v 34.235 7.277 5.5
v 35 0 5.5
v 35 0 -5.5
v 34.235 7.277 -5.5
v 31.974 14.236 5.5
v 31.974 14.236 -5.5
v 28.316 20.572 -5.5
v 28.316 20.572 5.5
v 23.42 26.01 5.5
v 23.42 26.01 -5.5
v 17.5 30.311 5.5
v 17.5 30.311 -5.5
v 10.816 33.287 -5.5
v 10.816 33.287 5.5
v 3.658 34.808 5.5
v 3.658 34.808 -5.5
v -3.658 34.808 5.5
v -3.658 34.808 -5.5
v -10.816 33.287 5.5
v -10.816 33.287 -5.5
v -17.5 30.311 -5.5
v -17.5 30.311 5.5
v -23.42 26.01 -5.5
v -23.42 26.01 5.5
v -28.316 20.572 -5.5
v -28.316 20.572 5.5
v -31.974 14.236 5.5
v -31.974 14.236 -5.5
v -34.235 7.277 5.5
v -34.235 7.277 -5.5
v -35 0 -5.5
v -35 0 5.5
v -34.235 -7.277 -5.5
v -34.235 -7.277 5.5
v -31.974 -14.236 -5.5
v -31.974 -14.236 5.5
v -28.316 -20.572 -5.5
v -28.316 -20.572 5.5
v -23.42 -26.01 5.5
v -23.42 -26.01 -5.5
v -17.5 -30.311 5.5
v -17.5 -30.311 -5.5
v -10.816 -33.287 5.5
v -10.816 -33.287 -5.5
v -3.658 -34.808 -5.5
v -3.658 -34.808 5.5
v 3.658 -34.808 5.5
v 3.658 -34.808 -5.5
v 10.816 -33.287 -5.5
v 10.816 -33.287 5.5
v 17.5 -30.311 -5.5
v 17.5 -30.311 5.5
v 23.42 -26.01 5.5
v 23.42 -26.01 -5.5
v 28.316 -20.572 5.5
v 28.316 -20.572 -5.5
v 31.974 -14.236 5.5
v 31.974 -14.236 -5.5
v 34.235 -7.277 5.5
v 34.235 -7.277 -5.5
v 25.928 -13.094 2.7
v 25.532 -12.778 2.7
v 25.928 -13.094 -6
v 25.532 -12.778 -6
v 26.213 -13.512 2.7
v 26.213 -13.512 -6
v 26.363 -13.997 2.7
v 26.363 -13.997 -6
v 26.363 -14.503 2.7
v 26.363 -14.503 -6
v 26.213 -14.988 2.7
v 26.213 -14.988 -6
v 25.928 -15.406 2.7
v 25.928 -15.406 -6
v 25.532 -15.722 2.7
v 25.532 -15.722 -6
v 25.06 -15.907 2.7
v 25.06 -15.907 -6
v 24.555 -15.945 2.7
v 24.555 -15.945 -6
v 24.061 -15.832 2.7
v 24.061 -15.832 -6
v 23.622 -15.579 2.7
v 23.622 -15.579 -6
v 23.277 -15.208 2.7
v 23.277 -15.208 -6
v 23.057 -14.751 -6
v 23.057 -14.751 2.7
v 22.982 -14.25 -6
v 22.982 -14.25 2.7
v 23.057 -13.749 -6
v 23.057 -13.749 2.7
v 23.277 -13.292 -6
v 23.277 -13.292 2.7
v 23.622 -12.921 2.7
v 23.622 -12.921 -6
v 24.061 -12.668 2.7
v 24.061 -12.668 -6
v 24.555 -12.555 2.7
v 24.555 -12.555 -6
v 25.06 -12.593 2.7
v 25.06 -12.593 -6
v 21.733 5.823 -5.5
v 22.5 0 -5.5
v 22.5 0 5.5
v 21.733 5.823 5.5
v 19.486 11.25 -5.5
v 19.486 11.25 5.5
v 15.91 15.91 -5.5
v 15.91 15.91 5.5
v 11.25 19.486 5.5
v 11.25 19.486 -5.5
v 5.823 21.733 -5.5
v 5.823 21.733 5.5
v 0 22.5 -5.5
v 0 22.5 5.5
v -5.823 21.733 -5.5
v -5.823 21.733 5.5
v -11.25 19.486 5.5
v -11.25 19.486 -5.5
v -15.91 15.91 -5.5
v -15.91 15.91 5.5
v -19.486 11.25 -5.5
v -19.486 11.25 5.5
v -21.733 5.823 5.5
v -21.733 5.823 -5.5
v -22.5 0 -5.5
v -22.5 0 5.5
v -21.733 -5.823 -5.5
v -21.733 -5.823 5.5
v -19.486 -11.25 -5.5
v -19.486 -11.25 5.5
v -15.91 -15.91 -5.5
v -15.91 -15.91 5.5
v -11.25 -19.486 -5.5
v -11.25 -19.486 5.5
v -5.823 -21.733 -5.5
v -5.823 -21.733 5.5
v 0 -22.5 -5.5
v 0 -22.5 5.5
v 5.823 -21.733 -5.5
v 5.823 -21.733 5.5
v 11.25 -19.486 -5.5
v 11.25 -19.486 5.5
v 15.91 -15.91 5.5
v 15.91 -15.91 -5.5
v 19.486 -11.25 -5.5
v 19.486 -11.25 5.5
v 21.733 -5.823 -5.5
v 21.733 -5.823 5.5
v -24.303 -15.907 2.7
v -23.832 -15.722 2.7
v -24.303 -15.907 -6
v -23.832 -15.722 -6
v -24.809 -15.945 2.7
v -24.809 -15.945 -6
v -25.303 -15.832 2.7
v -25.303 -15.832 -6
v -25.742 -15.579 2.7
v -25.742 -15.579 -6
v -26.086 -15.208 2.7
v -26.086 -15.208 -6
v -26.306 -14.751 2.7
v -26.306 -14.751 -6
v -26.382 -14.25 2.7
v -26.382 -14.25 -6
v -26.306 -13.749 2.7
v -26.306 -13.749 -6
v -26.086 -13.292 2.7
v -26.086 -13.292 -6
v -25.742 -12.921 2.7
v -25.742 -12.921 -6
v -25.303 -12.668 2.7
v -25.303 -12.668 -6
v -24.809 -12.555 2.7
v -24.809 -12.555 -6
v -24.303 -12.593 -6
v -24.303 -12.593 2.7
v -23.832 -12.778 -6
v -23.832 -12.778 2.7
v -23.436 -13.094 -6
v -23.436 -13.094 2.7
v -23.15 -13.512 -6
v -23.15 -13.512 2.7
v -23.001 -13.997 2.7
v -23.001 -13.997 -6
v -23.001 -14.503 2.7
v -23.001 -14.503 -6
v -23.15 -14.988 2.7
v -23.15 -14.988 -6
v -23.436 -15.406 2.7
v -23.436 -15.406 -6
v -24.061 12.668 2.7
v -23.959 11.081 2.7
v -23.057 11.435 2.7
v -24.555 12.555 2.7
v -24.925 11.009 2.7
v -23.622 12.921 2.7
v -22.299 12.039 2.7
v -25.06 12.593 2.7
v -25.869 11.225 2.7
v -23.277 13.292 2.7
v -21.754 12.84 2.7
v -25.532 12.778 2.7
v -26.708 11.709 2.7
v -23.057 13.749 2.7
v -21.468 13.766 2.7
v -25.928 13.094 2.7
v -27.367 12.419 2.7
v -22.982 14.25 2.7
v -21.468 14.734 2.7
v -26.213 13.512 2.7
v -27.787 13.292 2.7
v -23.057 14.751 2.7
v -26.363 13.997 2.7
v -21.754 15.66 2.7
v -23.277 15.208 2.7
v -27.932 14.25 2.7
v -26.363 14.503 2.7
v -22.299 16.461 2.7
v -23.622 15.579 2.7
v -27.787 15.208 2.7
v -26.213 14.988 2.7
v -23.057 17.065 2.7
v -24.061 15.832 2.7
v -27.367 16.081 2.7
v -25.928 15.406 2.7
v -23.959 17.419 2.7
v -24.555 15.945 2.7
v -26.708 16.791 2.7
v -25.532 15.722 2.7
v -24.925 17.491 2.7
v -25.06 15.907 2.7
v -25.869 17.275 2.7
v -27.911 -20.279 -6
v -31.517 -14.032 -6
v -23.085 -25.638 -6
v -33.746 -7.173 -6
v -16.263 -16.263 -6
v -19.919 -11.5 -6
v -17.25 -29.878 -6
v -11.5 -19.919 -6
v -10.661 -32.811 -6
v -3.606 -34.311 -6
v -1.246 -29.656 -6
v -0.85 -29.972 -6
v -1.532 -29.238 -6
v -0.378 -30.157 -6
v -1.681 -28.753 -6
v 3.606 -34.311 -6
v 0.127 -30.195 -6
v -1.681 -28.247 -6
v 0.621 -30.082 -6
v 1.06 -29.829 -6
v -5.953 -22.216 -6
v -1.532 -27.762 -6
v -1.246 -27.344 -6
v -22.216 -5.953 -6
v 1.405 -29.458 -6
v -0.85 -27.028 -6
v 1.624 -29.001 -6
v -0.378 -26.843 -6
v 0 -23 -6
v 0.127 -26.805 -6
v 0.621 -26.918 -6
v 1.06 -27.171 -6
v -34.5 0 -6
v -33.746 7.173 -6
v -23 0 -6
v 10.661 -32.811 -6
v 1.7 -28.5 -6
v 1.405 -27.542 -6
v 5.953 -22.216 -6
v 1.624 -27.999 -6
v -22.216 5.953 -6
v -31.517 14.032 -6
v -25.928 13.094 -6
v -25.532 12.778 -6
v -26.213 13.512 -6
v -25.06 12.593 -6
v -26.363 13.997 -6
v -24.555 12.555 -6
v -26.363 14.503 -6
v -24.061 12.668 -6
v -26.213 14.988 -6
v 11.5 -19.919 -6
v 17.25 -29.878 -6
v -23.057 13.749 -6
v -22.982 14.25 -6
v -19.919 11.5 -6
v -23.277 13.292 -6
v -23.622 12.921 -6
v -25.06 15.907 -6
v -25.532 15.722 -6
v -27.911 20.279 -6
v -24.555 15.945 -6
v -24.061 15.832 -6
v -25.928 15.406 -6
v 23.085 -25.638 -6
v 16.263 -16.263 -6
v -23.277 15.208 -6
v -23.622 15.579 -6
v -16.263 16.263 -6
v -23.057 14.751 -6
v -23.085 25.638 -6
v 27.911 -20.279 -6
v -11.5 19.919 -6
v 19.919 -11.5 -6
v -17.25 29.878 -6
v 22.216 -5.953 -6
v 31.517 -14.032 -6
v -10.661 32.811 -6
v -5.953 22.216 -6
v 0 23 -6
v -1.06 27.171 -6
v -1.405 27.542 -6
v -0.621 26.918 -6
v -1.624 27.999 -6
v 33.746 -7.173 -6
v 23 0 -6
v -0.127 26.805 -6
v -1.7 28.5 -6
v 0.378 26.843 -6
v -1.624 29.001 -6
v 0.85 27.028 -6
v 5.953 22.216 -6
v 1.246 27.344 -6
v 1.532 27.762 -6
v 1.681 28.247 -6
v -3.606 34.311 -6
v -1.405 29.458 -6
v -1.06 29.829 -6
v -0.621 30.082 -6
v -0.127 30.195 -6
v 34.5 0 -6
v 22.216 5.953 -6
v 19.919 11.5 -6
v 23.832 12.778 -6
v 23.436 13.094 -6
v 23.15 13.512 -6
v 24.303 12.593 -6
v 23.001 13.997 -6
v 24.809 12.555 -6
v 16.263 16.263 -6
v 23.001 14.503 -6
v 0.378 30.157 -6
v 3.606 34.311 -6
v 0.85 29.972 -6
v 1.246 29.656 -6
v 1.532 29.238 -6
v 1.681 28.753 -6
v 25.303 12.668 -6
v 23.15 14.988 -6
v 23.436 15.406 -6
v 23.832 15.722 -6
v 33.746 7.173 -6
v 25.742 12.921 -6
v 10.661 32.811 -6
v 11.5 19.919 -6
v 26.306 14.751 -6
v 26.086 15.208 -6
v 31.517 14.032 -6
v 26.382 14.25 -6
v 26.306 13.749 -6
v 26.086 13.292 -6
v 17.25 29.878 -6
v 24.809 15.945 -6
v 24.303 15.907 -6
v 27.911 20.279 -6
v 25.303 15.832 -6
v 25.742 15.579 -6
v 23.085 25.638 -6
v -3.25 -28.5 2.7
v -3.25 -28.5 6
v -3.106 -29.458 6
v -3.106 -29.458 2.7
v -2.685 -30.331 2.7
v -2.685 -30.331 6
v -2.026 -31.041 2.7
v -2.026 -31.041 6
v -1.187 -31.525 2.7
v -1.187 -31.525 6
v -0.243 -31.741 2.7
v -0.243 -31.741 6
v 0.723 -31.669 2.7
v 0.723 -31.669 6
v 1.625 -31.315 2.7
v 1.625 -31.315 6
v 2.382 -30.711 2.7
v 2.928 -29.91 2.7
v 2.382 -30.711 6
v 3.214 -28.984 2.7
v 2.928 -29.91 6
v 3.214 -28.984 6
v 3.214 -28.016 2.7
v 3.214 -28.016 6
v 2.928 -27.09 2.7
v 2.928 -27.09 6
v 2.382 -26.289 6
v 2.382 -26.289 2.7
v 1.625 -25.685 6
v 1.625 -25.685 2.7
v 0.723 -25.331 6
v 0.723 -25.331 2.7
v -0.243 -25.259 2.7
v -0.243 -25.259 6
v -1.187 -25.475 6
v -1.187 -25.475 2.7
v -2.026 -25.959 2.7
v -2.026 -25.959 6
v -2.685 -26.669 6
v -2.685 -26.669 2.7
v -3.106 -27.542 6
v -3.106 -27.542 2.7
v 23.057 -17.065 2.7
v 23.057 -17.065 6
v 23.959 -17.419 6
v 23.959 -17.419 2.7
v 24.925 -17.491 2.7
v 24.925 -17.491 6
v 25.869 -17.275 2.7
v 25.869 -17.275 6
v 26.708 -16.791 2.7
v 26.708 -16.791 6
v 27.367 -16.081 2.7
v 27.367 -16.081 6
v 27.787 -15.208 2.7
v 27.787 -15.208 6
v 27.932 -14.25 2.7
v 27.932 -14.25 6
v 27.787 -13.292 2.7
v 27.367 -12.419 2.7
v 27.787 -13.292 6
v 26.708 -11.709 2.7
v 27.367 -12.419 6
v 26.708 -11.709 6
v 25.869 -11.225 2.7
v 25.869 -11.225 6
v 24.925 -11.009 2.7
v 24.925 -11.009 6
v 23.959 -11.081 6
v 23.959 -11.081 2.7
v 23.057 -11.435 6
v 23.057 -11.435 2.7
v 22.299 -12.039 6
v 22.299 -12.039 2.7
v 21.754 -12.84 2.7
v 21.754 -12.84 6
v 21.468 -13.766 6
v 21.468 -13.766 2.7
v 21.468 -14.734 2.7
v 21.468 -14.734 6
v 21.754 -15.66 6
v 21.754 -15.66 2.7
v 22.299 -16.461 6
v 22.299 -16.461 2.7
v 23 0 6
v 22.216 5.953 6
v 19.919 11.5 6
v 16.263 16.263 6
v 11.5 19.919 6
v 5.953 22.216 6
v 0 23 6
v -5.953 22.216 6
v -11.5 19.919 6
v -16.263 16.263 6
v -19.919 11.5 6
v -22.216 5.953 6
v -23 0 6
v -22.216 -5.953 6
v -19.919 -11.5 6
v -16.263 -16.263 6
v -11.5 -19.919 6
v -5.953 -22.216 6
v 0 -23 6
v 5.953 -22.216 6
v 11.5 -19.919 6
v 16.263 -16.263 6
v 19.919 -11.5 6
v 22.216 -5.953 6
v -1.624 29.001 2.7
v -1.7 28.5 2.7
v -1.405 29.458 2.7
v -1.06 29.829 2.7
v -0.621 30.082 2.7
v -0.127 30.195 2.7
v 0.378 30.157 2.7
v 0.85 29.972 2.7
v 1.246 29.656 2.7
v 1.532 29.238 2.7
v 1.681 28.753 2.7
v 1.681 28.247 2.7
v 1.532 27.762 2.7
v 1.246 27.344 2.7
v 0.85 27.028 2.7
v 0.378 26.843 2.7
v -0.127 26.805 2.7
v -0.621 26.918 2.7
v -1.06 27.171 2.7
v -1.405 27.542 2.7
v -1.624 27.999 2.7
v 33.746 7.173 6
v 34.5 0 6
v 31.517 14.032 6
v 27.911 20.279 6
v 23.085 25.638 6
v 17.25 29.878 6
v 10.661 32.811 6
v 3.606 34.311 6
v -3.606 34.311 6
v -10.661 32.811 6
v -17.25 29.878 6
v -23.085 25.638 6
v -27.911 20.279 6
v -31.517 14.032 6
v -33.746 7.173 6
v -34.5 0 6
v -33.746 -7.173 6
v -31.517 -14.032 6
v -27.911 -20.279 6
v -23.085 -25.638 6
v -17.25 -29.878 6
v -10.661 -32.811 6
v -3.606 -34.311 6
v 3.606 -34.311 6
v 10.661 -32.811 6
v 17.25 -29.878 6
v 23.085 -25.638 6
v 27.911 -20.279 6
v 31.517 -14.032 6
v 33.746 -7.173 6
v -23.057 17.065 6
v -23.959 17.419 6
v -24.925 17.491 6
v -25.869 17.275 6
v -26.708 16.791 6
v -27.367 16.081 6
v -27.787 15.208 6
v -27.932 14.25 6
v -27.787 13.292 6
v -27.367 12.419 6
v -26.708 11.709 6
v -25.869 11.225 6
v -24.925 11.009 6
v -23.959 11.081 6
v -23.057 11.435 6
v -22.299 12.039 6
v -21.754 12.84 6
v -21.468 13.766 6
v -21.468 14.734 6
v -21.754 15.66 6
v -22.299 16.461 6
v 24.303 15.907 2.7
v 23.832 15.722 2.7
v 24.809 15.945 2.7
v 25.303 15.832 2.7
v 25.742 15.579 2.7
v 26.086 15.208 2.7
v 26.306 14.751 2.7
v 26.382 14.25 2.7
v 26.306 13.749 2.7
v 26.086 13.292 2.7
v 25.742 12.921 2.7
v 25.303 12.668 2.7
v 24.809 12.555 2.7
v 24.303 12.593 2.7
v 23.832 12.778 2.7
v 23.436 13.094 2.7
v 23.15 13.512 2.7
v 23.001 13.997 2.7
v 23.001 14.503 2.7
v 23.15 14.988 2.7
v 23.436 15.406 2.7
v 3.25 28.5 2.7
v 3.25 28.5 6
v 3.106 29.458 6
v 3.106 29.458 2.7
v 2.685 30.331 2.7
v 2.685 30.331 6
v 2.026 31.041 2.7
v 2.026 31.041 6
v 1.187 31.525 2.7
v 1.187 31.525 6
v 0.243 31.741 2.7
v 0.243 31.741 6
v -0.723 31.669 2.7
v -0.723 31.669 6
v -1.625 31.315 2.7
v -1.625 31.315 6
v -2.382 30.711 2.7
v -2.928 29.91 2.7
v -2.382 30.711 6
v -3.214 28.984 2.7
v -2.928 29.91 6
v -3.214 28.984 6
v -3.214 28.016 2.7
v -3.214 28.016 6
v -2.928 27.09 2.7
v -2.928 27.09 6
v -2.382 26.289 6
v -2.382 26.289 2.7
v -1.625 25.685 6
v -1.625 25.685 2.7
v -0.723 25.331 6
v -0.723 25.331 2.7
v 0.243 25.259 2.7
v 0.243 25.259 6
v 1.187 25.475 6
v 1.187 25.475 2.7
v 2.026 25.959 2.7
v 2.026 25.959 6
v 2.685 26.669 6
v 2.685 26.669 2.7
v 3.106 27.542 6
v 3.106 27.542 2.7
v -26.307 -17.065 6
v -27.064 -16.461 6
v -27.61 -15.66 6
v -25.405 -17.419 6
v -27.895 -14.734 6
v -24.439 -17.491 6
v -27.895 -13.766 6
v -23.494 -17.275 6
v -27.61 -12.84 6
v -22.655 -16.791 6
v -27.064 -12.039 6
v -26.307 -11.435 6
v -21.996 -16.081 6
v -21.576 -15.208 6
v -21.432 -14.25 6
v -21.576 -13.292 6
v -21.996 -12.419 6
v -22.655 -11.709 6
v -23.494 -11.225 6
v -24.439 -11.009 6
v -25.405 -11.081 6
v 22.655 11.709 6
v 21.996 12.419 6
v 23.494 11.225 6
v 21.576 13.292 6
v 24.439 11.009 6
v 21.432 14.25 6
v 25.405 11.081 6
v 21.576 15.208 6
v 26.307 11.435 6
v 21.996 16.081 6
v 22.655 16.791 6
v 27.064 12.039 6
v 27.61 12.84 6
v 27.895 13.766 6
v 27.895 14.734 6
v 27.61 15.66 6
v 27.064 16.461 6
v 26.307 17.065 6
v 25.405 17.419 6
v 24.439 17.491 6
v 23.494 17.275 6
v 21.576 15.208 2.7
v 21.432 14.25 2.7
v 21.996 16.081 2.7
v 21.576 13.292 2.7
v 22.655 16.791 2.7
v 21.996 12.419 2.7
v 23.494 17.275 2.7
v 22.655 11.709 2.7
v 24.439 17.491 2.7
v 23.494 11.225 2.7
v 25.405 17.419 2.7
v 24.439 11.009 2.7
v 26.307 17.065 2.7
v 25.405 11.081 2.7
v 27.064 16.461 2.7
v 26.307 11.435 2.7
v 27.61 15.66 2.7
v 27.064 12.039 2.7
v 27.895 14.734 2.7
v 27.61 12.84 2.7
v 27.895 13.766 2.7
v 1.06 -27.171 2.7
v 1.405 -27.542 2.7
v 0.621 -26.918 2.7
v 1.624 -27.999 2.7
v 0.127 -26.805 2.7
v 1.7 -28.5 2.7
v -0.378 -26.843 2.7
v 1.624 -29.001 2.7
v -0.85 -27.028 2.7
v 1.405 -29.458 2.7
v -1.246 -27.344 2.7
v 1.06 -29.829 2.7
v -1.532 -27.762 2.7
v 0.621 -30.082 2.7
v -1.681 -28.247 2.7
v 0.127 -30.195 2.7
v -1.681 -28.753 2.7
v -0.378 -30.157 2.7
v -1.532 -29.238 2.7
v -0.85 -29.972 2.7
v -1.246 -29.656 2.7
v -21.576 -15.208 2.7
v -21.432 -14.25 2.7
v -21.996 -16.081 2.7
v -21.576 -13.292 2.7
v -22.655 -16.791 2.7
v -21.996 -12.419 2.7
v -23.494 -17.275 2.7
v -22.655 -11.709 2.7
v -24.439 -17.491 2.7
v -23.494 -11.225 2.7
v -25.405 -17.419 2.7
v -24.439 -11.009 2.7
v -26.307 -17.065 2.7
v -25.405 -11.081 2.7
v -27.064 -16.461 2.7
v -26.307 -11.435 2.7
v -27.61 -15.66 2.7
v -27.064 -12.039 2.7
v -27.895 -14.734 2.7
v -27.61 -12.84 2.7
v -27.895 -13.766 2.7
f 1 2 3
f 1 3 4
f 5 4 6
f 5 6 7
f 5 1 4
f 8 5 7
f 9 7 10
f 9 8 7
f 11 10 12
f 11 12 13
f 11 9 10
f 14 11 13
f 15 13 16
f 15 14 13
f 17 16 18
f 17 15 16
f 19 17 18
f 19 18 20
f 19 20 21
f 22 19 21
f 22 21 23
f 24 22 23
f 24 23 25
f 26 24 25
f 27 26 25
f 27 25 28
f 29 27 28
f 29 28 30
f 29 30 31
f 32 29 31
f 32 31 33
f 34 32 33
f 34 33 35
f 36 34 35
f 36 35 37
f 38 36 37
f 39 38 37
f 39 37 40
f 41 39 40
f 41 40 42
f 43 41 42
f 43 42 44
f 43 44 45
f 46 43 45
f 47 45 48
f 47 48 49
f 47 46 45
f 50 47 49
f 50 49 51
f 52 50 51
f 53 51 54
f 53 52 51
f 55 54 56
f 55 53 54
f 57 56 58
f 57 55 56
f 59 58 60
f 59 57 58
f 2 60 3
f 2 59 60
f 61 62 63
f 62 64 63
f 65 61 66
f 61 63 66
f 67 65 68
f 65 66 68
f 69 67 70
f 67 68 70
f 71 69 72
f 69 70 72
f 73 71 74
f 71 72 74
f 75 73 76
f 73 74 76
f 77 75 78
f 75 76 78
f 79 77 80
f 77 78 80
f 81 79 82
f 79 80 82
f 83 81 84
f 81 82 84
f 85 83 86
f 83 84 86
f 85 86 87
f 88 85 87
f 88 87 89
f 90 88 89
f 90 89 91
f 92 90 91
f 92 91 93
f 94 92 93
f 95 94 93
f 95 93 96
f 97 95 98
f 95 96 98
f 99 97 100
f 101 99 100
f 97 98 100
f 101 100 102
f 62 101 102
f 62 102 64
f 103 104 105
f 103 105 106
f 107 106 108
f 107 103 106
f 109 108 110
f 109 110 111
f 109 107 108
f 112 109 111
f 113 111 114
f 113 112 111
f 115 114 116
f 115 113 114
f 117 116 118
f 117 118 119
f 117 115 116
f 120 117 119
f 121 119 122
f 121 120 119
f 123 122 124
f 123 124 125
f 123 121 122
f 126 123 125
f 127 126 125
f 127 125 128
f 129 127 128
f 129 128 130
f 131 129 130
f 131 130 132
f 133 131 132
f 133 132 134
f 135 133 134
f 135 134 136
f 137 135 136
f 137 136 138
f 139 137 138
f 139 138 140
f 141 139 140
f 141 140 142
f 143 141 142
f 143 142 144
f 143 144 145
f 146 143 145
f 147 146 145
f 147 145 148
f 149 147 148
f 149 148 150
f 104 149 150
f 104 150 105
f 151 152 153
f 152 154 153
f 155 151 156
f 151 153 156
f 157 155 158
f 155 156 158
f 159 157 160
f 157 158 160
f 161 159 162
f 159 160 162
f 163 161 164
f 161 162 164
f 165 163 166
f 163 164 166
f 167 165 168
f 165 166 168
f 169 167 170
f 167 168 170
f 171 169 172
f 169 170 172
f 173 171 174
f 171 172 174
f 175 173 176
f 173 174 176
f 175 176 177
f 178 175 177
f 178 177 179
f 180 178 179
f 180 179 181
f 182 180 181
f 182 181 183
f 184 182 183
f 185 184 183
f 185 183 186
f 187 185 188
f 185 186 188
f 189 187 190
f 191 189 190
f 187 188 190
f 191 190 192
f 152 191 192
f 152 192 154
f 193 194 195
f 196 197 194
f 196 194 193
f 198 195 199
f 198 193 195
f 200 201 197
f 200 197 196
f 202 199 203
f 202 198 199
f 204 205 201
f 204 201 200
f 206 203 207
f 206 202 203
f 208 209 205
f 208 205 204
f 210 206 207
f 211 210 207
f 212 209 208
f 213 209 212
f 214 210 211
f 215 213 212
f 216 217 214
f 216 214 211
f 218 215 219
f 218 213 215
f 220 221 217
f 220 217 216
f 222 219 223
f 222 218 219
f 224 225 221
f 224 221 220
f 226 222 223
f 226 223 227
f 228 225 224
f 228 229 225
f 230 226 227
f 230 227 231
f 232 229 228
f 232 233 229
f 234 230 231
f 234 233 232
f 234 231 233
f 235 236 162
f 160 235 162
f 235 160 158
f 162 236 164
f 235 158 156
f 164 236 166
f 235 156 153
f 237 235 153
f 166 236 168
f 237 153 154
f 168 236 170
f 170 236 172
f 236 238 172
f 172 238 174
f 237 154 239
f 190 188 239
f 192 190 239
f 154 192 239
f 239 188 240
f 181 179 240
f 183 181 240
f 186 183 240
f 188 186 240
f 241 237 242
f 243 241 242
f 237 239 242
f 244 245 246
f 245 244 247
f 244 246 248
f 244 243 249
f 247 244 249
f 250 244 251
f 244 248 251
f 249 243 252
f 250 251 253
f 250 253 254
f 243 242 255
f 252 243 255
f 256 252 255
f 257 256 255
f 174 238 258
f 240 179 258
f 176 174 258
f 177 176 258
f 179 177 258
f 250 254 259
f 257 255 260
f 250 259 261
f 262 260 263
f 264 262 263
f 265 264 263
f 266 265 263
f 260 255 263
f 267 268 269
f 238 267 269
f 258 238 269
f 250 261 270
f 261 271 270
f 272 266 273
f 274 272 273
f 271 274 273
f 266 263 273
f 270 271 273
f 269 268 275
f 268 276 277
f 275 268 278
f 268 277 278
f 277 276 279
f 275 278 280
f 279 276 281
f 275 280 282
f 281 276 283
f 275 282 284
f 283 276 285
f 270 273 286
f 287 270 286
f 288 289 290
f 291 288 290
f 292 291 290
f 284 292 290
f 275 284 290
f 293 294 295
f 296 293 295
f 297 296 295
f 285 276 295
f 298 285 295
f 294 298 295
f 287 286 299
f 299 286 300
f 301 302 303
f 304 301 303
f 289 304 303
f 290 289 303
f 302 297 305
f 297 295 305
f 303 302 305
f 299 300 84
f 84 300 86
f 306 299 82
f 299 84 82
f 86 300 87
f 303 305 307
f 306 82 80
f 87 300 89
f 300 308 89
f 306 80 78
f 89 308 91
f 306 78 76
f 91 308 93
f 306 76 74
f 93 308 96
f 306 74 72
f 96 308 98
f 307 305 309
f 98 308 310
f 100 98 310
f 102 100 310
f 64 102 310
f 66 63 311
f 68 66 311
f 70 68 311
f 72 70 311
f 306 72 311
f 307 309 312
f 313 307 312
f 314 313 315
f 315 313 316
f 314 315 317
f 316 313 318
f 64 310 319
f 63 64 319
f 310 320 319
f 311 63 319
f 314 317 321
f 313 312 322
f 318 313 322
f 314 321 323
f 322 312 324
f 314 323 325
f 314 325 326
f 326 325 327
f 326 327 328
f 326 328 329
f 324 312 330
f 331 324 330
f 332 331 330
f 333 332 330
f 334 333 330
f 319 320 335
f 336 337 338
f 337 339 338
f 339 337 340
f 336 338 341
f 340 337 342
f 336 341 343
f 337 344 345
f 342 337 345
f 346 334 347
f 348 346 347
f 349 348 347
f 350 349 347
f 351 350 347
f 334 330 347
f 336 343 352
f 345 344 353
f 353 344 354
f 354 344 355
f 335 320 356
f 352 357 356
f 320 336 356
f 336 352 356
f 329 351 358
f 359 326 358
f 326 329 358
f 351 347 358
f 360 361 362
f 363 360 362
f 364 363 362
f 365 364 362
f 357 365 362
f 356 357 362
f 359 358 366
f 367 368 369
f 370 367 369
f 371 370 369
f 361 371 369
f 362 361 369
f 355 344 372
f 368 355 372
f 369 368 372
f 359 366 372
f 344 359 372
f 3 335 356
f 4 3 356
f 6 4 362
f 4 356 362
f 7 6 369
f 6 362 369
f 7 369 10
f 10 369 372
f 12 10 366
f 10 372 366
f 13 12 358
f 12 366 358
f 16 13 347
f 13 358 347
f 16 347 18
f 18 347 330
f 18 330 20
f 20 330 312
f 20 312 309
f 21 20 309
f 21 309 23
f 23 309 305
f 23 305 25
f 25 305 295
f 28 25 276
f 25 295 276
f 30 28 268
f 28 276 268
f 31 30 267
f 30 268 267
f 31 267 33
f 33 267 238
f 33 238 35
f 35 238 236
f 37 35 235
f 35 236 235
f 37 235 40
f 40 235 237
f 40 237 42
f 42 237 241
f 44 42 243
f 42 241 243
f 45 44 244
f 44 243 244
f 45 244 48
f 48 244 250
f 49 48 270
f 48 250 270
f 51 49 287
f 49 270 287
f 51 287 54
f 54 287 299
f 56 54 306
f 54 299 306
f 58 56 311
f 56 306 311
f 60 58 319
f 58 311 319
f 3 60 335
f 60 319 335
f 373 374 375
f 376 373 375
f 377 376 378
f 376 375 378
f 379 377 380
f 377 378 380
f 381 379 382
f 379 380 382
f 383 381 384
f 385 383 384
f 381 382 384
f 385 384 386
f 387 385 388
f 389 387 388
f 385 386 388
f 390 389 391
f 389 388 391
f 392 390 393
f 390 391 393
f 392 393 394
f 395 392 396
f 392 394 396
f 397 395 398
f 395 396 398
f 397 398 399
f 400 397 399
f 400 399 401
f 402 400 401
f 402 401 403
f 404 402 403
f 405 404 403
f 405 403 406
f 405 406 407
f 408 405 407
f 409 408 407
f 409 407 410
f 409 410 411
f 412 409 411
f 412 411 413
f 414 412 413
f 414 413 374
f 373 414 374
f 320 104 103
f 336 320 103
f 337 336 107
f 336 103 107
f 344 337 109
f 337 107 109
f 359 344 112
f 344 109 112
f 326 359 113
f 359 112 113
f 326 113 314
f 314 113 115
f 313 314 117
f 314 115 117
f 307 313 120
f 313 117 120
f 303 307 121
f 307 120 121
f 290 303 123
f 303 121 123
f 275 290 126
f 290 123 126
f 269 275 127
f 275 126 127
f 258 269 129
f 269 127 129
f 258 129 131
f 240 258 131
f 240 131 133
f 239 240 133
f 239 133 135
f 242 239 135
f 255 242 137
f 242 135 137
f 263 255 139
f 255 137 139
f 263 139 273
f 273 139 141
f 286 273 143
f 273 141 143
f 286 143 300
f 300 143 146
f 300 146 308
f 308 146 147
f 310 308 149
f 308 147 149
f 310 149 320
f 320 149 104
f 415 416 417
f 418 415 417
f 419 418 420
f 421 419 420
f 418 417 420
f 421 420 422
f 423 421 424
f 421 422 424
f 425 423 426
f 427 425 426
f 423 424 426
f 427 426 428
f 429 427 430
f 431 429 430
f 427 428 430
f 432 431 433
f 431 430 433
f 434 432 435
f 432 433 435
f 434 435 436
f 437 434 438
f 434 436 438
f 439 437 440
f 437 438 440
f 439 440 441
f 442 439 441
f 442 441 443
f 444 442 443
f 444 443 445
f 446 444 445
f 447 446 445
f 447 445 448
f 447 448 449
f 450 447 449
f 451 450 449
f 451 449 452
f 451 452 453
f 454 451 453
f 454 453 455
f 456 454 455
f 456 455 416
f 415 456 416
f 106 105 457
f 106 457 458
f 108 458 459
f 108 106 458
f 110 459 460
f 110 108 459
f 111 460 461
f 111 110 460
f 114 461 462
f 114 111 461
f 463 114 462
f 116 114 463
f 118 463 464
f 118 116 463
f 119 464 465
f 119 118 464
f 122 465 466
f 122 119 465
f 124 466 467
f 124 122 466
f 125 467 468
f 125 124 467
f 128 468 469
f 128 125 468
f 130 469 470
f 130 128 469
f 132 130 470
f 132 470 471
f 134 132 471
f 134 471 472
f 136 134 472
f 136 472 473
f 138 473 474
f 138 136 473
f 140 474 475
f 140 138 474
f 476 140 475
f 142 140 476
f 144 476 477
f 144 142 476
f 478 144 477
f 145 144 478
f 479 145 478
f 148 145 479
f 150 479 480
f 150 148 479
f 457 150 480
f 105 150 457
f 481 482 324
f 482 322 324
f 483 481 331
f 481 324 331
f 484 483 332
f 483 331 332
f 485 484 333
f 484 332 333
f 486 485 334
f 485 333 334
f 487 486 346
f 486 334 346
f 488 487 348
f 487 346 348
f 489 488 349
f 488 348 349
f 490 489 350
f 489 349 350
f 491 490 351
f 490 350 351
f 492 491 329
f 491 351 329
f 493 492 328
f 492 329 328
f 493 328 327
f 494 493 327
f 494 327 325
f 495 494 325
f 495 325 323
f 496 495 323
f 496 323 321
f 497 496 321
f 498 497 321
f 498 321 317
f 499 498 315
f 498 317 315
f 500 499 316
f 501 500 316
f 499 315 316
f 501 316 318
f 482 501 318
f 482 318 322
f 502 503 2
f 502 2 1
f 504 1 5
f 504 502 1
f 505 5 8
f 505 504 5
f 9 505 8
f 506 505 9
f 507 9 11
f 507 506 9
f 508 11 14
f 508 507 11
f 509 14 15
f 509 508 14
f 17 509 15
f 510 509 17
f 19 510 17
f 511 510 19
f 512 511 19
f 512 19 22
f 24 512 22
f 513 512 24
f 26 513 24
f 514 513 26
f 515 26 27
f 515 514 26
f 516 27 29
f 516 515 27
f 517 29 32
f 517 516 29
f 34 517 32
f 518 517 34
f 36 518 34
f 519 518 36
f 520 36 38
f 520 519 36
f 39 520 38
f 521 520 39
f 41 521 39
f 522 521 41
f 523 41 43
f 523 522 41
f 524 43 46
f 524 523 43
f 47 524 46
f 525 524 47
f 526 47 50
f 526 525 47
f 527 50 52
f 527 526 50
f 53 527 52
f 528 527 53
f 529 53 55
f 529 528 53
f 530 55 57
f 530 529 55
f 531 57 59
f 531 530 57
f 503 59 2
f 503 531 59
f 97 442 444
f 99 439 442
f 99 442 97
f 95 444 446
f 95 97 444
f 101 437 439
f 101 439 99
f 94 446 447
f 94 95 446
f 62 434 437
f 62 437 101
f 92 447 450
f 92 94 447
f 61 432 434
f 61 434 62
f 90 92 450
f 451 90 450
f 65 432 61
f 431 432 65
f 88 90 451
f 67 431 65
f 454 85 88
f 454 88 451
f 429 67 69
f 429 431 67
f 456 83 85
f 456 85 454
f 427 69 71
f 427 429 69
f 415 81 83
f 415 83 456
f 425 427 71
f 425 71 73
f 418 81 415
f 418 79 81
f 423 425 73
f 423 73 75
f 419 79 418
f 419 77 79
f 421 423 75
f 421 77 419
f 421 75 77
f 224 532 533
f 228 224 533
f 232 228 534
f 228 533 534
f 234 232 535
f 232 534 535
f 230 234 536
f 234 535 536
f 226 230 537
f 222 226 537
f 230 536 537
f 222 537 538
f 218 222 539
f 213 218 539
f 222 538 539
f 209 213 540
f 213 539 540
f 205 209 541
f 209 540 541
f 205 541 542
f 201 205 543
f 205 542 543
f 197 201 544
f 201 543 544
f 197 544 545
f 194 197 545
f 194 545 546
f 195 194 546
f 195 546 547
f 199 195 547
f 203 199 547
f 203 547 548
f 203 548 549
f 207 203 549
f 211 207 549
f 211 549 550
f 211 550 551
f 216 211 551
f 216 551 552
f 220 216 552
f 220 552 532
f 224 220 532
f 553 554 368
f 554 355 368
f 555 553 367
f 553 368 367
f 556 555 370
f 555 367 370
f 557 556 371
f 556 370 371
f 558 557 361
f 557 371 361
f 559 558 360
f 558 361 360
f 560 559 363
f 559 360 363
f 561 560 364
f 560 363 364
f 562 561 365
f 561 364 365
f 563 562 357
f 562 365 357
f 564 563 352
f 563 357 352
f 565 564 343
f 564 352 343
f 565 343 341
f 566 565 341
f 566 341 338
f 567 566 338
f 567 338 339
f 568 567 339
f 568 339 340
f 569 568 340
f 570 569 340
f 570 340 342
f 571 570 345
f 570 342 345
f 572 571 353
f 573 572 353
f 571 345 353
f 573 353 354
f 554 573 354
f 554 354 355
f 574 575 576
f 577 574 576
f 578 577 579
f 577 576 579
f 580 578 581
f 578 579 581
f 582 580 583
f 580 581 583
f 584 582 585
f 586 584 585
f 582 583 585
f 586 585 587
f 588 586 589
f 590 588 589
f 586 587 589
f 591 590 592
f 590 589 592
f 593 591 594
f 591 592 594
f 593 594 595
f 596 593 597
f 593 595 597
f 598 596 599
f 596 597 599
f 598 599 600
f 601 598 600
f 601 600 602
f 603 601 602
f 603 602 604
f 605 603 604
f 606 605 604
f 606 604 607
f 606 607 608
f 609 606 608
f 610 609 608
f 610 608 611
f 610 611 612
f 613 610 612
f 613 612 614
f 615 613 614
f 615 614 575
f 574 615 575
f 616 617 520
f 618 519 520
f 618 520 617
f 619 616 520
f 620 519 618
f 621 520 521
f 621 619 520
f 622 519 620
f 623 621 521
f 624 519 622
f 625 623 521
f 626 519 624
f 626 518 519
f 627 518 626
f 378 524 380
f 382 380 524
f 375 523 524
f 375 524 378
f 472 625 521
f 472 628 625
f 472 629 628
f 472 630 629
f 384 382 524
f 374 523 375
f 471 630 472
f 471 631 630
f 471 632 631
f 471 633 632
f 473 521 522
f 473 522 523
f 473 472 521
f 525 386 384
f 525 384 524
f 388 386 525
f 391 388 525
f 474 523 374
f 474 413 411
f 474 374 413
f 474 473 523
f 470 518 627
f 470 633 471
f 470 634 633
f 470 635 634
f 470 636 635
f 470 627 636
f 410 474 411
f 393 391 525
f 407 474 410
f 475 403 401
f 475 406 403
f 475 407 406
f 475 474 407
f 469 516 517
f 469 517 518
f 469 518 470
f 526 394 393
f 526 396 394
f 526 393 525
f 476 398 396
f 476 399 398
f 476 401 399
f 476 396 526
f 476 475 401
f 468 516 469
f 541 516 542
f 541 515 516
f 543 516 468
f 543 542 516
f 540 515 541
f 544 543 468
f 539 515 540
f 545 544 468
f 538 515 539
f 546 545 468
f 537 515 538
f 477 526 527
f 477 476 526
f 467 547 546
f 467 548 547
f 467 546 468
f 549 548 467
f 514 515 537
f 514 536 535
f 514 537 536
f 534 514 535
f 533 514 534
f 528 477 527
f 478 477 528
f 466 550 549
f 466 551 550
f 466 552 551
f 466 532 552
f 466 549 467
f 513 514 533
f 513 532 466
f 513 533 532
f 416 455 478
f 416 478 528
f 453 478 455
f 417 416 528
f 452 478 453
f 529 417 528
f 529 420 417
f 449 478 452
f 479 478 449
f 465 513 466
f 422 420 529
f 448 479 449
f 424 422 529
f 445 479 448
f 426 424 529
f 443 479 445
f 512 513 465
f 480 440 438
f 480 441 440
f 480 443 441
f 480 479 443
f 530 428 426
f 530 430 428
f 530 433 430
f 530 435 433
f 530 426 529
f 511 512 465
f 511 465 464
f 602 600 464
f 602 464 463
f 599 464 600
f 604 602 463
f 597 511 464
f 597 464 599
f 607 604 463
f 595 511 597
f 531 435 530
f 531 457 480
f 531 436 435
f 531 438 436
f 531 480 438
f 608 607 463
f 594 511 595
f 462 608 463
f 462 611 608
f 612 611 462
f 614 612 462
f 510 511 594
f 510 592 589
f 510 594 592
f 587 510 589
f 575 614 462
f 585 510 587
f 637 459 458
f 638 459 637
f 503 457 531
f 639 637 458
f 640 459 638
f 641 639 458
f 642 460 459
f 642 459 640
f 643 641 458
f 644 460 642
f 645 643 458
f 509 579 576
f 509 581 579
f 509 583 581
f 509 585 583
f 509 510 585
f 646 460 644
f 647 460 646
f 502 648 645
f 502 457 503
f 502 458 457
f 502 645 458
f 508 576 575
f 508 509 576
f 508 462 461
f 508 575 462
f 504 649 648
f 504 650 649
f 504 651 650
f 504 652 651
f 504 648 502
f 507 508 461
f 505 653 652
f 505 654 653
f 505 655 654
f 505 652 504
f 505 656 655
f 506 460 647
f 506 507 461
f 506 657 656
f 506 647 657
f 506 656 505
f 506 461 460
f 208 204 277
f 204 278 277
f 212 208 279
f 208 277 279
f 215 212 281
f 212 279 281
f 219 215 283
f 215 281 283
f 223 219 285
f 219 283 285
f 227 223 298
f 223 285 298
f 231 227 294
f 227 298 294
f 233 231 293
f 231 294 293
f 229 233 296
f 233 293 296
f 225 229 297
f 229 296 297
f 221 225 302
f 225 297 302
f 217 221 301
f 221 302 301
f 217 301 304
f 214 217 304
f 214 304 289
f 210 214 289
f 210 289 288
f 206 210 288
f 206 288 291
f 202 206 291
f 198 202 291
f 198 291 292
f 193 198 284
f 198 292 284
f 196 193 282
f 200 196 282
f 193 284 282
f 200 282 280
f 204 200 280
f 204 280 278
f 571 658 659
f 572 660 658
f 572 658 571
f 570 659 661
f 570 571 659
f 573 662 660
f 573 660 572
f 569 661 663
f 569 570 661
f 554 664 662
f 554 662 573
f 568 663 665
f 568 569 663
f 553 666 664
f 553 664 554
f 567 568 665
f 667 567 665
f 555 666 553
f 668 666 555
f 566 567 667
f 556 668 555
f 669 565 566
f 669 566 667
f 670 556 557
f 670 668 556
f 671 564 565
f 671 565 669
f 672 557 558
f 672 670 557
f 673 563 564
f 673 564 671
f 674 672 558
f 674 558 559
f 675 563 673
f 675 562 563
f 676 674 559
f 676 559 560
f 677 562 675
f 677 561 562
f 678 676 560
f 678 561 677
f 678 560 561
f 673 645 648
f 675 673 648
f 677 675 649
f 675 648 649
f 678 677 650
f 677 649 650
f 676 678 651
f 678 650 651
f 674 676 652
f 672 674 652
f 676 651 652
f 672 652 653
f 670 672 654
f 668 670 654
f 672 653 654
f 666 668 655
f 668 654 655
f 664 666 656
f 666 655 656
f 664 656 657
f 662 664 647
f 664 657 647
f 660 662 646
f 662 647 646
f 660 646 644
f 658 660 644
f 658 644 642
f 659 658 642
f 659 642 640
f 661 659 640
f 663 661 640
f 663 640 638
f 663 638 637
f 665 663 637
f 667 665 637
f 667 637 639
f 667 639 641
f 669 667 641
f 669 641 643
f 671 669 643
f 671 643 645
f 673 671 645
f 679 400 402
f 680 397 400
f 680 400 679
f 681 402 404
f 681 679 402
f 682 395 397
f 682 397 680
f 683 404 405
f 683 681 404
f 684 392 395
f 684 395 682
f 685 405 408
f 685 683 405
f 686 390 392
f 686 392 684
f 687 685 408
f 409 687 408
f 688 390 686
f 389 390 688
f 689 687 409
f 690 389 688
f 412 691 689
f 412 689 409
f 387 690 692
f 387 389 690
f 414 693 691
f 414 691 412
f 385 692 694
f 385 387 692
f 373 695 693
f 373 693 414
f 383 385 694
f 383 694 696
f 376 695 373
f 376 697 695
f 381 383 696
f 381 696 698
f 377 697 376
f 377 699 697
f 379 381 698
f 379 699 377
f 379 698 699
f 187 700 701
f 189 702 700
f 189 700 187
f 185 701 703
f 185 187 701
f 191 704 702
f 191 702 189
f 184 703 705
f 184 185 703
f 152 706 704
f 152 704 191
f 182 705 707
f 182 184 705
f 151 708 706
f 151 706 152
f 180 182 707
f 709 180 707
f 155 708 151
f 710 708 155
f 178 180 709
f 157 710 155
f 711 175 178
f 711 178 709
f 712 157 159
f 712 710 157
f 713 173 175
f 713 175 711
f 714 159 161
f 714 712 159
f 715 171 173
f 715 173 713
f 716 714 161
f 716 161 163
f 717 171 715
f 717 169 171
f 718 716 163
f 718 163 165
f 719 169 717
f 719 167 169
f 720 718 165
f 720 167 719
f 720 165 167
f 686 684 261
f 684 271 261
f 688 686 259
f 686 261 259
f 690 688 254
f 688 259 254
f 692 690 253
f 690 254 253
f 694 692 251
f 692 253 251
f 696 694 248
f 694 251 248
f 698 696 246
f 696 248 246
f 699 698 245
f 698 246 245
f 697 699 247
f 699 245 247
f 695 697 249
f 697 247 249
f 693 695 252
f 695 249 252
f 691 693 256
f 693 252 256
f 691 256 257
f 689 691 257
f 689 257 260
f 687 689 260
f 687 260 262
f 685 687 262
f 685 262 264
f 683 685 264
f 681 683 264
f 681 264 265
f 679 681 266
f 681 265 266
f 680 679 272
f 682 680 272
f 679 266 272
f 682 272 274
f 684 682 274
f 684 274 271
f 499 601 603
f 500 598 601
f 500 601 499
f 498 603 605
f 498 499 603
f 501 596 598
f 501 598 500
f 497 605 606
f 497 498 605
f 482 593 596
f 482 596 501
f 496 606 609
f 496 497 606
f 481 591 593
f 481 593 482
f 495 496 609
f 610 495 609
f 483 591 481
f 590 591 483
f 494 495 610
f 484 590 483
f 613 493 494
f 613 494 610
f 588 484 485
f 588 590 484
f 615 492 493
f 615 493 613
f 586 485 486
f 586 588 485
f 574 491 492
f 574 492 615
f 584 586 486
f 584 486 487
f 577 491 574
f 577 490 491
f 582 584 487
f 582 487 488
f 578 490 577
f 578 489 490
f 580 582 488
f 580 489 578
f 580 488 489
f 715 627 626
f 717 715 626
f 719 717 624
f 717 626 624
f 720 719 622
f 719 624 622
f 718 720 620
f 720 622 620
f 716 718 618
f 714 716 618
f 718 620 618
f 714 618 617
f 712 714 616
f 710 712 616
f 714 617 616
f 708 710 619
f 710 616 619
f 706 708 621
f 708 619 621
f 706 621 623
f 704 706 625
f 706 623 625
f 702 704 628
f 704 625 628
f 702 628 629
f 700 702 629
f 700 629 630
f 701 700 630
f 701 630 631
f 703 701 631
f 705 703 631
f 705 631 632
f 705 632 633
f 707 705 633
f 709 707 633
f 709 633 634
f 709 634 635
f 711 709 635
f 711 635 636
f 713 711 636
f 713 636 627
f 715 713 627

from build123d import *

# Parameters (mm, degrees)
SKETCH_1_R                   = 35
SKETCH_1_R_2                 = 22.5
EXTRUDE_1_DEPTH              = 6
HOLE_WIZARD_M3_1_D           = 3.4
HOLE_WIZARD_M3_1_CBORE_D     = 6.5
HOLE_WIZARD_M3_1_CBORE_DEPTH = 3.3
PATTERN_CIRCULAR_1_COUNT     = 6
CHAMFER_1_SIZE               = 0.5


with BuildPart() as part:
    # 스케치1 → 보스-돌출1 (new, symmetric)
    with BuildSketch(Plane.XY):
        Circle(SKETCH_1_R)
        Circle(SKETCH_1_R_2, mode=Mode.SUBTRACT)
    extrude(amount=EXTRUDE_1_DEPTH, both=True)

    # M3 육각 소켓 머리 캡 나사용 카운터보어1 (through all)
    with Locations(Plane.XY.offset(6)):
        with Locations((0, 28.5)):
            hole_wizard_m3_1 = CounterBoreHole(HOLE_WIZARD_M3_1_D / 2, HOLE_WIZARD_M3_1_CBORE_D / 2, HOLE_WIZARD_M3_1_CBORE_DEPTH)

    # 원형 패턴1: M3 육각 소켓 머리 캡 나사용 카운터보어1 ×6 about axis
    pattern_circular_1_axis = Axis((0, 0, 6), (0, 0, -1))
    for i in range(1, PATTERN_CIRCULAR_1_COUNT):
        add(hole_wizard_m3_1.rotate(pattern_circular_1_axis, i * 360 / PATTERN_CIRCULAR_1_COUNT), mode=Mode.SUBTRACT)

    # 모따기1
    chamfer_1_edges = [part.edges().sort_by_distance(p)[0] for p in [
        (-35, 0, -6),
        (-35, 0, 6),
        (-22.5, 0, -6),
        (-22.5, 0, 6),
    ]]
    chamfer(chamfer_1_edges, length=CHAMFER_1_SIZE)


solid = part.part
